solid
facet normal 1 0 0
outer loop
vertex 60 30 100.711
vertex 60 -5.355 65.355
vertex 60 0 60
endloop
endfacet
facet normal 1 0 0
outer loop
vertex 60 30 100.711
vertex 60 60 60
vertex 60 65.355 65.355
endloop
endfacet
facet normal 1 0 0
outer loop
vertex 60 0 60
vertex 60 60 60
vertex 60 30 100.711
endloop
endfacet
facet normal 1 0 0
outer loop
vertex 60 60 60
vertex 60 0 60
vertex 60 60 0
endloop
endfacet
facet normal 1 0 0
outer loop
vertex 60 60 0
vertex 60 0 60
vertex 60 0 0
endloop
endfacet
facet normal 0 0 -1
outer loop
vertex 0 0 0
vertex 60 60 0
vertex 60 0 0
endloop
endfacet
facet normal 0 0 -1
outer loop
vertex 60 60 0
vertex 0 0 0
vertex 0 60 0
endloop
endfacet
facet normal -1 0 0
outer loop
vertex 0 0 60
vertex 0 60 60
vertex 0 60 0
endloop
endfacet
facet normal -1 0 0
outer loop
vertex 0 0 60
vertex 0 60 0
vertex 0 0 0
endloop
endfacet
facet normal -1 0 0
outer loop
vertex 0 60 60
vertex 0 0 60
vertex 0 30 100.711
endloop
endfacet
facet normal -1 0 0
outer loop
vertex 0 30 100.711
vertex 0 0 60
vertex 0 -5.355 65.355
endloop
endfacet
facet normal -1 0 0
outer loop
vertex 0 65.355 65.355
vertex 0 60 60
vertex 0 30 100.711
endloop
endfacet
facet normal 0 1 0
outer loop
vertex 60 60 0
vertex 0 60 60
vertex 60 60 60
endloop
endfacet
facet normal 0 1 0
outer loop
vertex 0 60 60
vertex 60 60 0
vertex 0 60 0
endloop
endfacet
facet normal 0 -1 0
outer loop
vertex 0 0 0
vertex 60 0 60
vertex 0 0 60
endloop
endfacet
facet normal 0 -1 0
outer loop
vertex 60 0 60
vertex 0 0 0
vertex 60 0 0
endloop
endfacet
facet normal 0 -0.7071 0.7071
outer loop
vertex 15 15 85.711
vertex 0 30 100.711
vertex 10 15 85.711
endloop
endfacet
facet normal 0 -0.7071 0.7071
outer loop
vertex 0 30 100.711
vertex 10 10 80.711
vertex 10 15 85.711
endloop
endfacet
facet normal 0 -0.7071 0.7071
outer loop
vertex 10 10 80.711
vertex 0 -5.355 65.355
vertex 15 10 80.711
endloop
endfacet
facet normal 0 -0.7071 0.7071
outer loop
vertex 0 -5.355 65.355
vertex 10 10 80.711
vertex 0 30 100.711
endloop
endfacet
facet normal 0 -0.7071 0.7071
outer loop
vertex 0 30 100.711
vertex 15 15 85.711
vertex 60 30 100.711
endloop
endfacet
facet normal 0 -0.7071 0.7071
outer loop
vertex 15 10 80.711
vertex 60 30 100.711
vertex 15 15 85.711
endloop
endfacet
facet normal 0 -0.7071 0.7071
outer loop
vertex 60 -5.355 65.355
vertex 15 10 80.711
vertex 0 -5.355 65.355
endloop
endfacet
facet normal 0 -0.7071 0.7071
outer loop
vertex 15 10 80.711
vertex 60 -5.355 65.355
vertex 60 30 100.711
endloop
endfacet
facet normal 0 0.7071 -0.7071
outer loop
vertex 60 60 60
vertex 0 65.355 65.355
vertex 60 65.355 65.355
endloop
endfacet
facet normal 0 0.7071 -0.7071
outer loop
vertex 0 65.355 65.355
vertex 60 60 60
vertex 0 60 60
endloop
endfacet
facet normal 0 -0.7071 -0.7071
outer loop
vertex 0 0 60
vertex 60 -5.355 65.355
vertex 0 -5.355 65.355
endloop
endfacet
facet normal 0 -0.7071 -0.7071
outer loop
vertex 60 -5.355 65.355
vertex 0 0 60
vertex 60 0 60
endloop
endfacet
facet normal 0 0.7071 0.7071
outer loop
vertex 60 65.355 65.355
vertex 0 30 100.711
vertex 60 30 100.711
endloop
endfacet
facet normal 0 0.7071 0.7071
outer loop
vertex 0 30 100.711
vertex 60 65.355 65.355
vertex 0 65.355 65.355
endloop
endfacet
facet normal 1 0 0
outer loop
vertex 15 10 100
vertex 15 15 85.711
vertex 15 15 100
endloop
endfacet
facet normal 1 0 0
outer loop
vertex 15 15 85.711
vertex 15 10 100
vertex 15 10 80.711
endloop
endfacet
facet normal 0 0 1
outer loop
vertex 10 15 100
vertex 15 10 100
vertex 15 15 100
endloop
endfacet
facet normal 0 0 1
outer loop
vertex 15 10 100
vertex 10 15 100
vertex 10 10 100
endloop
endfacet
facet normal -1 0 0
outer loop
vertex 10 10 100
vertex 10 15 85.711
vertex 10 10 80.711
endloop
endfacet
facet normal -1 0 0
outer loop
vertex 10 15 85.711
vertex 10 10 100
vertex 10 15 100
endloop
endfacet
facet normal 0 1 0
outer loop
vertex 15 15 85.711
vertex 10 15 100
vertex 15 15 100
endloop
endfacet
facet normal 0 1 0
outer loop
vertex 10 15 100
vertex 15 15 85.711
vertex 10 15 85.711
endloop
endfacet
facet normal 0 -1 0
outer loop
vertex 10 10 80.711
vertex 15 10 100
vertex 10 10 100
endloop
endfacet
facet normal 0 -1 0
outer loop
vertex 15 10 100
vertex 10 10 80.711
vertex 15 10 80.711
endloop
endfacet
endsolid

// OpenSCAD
// Übung 2: Basiskurs OpenSCAD
// (c) berlincreators.de

// Haus
module house() {
    cube([60,60,60]);
    translate([0, 30, 30]) rotate([45,0,0]) cube([60,50,50]); 
    translate([10, 10, 50]) cube([5,5,50]); 
}

// Turm
module tower() {
    cylinder(h=100, r1=5, r2=0);
    translate([0, 0, 70]) sphere(5); 
}

// Brücke
module bridge() {
    // Fahrbahn
    translate([0,0,50]) cube([300,30,10]);
    // Träger
    translate([80,-2.5,0]) cube([5,5,120]);
    translate([220,-2.5,0]) cube([5,5,120]);
    translate([80,27.5,0]) cube([5,5,120]);
    translate([220,27.5,0]) cube([5,5,120]);
    // Tragseile
    translate([80,0,120]) rotate([0,-135,0]) cylinder(d=1,h=90);
    translate([80,30,120]) rotate([0,-135,0]) cylinder(d=1,h=90);
    translate([85,0,120]) rotate([0,135,0]) cylinder(d=1,h=90);
    translate([85,30,120]) rotate([0,135,0]) cylinder(d=1,h=90);
    translate([220,0,120]) rotate([0,-135,0]) cylinder(d=1,h=90);
    translate([220,30,120]) rotate([0,-135,0]) cylinder(d=1,h=90);
    translate([225,0,120]) rotate([0,135,0]) cylinder(d=1,h=90);
    translate([225,30,120]) rotate([0,135,0]) cylinder(d=1,h=90);
}

!house();
tower();
bridge();
